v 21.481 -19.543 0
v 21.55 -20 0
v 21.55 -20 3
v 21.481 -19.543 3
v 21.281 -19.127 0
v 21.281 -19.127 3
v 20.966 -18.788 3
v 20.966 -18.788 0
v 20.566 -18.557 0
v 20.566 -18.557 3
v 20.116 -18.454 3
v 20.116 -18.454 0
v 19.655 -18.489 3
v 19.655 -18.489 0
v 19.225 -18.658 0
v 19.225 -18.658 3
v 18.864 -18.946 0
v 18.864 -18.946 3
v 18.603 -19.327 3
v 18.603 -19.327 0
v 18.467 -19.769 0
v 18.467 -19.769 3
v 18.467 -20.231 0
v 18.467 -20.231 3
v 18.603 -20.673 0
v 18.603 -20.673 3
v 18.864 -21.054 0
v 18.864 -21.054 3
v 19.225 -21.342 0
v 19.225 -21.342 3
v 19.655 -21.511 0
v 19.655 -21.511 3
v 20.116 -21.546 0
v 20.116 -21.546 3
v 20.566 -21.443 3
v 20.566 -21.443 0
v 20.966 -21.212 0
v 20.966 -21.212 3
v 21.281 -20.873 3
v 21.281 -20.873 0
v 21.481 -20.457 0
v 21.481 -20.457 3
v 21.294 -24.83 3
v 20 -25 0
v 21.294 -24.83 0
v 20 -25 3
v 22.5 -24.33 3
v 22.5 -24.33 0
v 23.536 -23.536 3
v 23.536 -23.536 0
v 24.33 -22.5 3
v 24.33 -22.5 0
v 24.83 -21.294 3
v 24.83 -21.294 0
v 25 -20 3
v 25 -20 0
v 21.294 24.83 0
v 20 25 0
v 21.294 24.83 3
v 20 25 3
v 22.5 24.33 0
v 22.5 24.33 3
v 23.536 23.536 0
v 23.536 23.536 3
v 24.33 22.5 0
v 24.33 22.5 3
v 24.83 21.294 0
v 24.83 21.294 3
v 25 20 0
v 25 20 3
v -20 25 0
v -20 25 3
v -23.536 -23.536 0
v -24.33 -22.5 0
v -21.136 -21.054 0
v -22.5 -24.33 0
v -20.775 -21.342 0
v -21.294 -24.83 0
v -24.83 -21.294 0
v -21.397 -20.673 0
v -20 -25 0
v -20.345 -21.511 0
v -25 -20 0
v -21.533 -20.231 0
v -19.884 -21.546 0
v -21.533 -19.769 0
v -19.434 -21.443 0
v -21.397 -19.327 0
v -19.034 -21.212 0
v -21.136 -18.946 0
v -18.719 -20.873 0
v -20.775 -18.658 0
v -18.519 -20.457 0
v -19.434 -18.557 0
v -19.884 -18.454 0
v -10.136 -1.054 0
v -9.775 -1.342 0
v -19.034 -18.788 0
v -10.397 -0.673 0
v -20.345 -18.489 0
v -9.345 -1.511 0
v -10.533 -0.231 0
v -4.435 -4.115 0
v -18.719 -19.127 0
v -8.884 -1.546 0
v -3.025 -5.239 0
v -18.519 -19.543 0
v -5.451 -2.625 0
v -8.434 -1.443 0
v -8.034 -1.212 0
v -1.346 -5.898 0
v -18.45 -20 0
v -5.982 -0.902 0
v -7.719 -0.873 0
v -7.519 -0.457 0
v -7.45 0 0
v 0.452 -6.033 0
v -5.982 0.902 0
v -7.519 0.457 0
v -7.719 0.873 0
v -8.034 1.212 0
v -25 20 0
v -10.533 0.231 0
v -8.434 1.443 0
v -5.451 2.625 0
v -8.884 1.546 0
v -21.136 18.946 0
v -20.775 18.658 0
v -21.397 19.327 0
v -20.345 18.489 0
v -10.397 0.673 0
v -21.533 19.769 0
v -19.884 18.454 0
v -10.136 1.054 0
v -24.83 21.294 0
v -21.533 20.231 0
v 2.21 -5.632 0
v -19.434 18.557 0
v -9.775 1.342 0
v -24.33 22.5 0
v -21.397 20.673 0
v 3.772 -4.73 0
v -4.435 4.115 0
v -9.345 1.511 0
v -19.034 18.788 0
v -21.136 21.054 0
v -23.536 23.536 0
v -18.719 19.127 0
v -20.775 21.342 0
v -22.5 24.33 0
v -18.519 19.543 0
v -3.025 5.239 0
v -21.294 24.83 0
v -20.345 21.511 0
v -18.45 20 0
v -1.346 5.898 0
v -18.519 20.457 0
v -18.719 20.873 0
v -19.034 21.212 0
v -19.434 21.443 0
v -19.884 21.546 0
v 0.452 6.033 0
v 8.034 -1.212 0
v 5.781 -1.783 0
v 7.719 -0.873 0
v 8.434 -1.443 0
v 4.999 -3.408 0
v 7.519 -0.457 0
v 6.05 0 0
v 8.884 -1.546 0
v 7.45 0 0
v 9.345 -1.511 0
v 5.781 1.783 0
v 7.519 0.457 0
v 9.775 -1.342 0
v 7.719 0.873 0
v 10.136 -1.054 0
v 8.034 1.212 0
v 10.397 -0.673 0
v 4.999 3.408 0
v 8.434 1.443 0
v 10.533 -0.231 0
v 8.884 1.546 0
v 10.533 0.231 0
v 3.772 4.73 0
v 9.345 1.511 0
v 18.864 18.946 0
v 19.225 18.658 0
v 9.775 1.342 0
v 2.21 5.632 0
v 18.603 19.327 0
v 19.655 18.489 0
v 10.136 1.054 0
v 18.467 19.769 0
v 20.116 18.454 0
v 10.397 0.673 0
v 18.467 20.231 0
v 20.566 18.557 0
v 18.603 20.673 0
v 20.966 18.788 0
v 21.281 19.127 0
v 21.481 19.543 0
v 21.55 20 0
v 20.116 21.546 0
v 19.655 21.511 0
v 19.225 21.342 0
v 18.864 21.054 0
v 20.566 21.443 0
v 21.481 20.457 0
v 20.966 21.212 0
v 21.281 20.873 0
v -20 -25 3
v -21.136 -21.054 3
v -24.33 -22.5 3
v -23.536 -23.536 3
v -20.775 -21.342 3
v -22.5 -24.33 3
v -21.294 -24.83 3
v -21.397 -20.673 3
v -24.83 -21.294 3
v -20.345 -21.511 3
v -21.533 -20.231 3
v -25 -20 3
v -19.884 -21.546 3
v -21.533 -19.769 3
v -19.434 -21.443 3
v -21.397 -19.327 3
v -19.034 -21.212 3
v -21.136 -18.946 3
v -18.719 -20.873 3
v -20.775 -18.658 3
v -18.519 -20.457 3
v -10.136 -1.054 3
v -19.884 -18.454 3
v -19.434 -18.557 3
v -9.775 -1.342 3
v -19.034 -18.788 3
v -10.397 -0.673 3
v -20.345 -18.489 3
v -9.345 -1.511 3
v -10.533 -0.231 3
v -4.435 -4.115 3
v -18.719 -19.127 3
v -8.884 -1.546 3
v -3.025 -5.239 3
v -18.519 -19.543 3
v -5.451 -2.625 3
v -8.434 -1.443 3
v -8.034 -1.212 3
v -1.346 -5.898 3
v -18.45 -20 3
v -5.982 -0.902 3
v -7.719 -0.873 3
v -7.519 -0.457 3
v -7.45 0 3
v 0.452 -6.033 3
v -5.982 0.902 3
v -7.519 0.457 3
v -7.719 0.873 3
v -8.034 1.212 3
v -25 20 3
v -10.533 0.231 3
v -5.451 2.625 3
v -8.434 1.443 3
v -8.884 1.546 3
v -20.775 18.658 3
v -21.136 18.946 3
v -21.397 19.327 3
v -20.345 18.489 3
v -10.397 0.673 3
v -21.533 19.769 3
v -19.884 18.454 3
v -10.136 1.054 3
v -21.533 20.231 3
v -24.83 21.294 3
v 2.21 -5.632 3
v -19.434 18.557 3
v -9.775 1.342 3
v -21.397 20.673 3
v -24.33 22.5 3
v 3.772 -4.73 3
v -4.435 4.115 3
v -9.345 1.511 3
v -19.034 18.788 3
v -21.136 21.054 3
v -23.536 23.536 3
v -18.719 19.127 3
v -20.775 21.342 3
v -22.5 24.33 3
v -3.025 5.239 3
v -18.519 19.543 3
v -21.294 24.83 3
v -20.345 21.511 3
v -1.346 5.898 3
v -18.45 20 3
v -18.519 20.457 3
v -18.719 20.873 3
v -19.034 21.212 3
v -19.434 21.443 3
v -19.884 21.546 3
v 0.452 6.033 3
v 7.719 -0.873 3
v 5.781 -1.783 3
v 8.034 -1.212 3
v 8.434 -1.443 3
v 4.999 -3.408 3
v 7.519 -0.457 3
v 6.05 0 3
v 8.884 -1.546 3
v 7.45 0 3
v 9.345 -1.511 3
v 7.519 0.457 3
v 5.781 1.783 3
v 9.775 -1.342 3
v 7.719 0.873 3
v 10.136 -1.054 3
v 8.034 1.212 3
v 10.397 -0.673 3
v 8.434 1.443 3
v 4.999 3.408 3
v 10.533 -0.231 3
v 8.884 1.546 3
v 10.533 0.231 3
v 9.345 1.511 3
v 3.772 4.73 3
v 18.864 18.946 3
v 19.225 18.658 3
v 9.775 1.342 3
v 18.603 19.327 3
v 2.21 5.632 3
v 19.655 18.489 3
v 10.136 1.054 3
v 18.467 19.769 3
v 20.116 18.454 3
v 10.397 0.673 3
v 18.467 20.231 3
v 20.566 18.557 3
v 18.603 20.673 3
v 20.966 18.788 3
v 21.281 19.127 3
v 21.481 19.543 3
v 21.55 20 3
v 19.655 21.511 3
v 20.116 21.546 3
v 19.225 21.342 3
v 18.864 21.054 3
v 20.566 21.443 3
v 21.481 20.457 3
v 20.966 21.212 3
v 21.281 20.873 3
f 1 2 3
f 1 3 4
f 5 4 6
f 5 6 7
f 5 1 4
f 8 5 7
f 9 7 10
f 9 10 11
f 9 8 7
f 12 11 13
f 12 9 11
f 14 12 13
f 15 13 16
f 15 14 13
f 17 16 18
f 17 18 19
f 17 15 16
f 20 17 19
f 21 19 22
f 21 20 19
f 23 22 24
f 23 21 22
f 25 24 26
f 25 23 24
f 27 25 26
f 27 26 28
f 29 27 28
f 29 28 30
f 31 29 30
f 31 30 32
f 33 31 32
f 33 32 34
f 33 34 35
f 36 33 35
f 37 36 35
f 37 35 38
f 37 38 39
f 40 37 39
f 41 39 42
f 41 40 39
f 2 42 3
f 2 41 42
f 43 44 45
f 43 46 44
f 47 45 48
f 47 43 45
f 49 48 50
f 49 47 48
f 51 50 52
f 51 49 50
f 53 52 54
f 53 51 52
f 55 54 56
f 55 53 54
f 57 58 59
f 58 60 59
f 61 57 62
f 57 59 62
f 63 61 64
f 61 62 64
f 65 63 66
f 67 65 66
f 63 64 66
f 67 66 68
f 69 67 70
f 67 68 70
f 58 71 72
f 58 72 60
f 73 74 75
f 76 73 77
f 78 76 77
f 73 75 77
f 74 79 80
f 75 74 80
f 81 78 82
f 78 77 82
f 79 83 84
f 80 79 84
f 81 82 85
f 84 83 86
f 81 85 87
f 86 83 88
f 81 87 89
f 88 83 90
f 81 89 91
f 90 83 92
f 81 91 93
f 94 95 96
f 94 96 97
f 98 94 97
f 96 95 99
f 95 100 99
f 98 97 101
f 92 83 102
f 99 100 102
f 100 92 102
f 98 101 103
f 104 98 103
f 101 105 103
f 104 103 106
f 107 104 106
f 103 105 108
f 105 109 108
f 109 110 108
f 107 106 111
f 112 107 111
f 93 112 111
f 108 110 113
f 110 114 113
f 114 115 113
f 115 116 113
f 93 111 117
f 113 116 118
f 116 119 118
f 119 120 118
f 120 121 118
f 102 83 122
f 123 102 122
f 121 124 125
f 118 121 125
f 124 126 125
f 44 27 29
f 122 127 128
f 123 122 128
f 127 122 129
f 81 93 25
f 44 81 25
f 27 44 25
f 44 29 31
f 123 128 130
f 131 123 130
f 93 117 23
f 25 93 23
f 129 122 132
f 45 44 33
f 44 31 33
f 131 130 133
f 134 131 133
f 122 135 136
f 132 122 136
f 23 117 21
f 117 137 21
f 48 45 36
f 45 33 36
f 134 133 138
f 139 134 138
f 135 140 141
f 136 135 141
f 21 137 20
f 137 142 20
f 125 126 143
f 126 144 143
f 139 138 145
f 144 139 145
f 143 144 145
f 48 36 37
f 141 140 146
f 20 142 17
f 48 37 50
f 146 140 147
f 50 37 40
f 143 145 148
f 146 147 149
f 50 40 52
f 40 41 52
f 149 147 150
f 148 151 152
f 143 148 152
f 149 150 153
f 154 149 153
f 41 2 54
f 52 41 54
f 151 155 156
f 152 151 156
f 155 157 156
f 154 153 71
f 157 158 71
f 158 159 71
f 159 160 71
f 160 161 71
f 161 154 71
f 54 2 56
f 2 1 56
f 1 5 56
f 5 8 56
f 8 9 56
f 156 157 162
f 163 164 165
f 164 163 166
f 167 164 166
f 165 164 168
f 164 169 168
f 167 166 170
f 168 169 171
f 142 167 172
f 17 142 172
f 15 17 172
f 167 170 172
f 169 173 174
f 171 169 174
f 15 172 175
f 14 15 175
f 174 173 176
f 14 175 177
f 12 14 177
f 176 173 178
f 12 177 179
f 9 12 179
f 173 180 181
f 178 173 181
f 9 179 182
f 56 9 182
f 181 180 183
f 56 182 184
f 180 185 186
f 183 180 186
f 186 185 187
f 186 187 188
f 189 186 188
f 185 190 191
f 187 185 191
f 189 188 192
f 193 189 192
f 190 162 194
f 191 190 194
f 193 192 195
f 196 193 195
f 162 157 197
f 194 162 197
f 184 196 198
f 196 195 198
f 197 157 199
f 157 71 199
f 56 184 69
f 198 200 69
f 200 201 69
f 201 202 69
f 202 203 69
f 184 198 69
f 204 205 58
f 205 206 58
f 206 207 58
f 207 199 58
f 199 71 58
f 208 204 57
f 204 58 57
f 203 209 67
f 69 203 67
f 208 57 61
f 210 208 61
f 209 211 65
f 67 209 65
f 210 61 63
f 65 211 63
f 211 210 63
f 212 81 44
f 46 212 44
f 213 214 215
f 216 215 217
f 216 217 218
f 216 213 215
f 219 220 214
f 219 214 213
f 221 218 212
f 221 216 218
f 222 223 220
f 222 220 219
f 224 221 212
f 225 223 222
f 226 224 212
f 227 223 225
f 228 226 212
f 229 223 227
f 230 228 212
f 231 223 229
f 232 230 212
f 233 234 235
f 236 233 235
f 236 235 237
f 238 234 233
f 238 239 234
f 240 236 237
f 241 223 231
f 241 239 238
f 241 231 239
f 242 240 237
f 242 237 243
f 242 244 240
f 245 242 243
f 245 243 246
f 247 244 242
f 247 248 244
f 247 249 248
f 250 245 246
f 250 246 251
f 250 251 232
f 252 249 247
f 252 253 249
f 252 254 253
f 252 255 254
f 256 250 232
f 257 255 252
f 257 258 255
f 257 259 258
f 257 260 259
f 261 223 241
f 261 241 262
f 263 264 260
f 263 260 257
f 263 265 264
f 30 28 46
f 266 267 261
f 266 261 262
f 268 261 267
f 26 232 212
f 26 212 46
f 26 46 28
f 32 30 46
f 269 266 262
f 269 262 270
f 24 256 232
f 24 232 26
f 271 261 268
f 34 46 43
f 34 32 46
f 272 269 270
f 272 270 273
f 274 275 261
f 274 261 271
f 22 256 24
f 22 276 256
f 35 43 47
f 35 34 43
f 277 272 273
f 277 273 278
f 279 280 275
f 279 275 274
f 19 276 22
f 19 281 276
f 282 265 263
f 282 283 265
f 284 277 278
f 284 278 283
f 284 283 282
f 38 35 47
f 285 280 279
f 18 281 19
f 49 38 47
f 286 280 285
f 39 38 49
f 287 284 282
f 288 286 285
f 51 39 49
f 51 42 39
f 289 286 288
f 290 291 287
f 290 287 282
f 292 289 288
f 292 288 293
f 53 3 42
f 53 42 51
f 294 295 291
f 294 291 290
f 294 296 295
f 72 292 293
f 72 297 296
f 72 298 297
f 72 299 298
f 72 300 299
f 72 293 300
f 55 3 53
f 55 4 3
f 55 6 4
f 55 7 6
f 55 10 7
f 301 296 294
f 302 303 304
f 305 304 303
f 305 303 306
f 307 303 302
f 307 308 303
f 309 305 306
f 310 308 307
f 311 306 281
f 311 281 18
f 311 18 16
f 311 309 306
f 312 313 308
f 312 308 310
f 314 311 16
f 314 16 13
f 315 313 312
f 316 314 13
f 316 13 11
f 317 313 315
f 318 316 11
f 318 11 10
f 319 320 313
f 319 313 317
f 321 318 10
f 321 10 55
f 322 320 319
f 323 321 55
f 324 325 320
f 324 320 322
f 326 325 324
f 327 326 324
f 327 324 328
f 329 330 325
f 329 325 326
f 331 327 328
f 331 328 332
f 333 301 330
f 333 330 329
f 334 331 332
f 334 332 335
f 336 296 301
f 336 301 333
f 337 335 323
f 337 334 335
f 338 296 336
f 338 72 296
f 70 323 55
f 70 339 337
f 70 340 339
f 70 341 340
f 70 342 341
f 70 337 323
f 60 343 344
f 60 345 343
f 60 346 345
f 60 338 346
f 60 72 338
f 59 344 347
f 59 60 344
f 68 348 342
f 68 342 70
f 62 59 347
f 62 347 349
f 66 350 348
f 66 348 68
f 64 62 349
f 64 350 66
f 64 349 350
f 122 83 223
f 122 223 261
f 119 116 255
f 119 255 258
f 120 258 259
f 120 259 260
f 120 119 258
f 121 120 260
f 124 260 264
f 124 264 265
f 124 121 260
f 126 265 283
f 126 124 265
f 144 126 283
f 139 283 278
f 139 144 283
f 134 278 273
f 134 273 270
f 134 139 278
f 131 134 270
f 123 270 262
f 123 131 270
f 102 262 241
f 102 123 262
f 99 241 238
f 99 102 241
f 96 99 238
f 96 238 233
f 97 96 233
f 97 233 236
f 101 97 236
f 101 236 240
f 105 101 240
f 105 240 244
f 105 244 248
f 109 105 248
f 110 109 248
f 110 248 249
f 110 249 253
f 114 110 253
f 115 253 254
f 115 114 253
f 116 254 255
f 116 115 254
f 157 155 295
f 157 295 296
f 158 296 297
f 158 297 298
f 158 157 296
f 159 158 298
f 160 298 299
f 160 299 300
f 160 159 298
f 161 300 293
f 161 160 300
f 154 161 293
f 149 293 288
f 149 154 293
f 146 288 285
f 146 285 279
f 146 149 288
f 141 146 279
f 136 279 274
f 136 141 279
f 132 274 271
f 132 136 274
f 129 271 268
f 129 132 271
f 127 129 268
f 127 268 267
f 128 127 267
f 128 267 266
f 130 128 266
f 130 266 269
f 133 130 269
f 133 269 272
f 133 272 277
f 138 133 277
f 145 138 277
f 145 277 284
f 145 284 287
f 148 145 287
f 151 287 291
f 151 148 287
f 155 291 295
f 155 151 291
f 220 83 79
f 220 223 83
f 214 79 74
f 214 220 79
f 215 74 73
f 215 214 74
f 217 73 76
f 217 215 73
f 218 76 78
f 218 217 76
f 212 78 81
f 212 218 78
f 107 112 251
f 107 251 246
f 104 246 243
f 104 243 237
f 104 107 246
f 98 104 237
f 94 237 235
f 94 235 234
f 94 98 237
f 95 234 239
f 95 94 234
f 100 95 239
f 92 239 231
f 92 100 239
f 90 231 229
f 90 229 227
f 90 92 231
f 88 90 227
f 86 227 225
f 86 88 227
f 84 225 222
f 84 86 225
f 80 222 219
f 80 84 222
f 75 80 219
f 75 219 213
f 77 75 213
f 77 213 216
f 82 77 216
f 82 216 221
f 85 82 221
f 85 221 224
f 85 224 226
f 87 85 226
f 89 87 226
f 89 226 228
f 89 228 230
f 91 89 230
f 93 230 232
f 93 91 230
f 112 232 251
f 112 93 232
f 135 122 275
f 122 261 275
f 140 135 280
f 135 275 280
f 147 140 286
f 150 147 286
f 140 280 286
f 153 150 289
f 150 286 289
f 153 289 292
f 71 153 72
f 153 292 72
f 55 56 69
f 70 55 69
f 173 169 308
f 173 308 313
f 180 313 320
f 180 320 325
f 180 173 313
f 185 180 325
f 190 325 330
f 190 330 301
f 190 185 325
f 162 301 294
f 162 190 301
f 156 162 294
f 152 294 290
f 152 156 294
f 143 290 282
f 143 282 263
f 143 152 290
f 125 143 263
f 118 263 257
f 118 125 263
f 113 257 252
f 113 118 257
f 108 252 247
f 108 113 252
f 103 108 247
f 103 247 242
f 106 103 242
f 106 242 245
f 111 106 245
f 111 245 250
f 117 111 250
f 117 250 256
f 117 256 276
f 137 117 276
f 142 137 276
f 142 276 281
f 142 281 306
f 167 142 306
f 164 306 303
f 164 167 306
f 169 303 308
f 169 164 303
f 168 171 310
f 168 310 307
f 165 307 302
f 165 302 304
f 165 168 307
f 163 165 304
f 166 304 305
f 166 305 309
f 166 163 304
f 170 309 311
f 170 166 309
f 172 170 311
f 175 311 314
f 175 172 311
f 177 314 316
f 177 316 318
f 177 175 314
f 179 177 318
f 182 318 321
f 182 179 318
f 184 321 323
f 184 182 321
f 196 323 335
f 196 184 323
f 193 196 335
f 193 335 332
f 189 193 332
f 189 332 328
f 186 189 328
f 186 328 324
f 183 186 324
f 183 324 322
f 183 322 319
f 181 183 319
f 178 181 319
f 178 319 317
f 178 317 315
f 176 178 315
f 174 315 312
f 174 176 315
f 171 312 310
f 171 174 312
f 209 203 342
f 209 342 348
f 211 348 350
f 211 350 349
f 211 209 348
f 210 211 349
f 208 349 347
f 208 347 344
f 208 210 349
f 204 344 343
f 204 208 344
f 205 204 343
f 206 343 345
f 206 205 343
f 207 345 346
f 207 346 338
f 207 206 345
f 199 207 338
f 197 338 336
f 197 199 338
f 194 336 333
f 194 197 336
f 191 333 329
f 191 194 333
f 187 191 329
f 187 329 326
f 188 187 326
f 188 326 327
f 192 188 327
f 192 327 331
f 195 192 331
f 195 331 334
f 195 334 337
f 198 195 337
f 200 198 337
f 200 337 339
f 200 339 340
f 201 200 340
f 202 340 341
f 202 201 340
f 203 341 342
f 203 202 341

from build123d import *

# Parameters (mm, degrees)
SKETCH_1_W      = 50
SKETCH_1_H      = 50
SKETCH_1_R      = 1.55
SKETCH_1_R_2    = 6.05
EXTRUDE_1_DEPTH = 3
FILLET_1_R      = 5


with BuildPart() as part:
    # ｽｹｯﾁ1 → ﾎﾞｽ - 押し出し1 (new body)
    with BuildSketch(Plane.XY):
        Rectangle(SKETCH_1_W, SKETCH_1_H)
        with Locations((-20, 20)):
            Circle(SKETCH_1_R, mode=Mode.SUBTRACT)
        with Locations((20, 20)):
            Circle(SKETCH_1_R, mode=Mode.SUBTRACT)
        with Locations((20, -20)):
            Circle(SKETCH_1_R, mode=Mode.SUBTRACT)
        with Locations((-20, -20)):
            Circle(SKETCH_1_R, mode=Mode.SUBTRACT)
        Circle(SKETCH_1_R_2, mode=Mode.SUBTRACT)
        with Locations((-9, 0)):
            Circle(SKETCH_1_R, mode=Mode.SUBTRACT)
        with Locations(Location((9, 0, 0), (0, 0, 180))):
            Circle(SKETCH_1_R, mode=Mode.SUBTRACT)
    extrude(amount=EXTRUDE_1_DEPTH)

    # ﾌｨﾚｯﾄ1
    fillet_1_edges = [part.edges().sort_by_distance(p)[0] for p in [
        (25, -25, 1.5),
        (-25, -25, 1.5),
        (-25, 25, 1.5),
        (25, 25, 1.5),
    ]]
    fillet(fillet_1_edges, radius=FILLET_1_R)


solid = part.part
